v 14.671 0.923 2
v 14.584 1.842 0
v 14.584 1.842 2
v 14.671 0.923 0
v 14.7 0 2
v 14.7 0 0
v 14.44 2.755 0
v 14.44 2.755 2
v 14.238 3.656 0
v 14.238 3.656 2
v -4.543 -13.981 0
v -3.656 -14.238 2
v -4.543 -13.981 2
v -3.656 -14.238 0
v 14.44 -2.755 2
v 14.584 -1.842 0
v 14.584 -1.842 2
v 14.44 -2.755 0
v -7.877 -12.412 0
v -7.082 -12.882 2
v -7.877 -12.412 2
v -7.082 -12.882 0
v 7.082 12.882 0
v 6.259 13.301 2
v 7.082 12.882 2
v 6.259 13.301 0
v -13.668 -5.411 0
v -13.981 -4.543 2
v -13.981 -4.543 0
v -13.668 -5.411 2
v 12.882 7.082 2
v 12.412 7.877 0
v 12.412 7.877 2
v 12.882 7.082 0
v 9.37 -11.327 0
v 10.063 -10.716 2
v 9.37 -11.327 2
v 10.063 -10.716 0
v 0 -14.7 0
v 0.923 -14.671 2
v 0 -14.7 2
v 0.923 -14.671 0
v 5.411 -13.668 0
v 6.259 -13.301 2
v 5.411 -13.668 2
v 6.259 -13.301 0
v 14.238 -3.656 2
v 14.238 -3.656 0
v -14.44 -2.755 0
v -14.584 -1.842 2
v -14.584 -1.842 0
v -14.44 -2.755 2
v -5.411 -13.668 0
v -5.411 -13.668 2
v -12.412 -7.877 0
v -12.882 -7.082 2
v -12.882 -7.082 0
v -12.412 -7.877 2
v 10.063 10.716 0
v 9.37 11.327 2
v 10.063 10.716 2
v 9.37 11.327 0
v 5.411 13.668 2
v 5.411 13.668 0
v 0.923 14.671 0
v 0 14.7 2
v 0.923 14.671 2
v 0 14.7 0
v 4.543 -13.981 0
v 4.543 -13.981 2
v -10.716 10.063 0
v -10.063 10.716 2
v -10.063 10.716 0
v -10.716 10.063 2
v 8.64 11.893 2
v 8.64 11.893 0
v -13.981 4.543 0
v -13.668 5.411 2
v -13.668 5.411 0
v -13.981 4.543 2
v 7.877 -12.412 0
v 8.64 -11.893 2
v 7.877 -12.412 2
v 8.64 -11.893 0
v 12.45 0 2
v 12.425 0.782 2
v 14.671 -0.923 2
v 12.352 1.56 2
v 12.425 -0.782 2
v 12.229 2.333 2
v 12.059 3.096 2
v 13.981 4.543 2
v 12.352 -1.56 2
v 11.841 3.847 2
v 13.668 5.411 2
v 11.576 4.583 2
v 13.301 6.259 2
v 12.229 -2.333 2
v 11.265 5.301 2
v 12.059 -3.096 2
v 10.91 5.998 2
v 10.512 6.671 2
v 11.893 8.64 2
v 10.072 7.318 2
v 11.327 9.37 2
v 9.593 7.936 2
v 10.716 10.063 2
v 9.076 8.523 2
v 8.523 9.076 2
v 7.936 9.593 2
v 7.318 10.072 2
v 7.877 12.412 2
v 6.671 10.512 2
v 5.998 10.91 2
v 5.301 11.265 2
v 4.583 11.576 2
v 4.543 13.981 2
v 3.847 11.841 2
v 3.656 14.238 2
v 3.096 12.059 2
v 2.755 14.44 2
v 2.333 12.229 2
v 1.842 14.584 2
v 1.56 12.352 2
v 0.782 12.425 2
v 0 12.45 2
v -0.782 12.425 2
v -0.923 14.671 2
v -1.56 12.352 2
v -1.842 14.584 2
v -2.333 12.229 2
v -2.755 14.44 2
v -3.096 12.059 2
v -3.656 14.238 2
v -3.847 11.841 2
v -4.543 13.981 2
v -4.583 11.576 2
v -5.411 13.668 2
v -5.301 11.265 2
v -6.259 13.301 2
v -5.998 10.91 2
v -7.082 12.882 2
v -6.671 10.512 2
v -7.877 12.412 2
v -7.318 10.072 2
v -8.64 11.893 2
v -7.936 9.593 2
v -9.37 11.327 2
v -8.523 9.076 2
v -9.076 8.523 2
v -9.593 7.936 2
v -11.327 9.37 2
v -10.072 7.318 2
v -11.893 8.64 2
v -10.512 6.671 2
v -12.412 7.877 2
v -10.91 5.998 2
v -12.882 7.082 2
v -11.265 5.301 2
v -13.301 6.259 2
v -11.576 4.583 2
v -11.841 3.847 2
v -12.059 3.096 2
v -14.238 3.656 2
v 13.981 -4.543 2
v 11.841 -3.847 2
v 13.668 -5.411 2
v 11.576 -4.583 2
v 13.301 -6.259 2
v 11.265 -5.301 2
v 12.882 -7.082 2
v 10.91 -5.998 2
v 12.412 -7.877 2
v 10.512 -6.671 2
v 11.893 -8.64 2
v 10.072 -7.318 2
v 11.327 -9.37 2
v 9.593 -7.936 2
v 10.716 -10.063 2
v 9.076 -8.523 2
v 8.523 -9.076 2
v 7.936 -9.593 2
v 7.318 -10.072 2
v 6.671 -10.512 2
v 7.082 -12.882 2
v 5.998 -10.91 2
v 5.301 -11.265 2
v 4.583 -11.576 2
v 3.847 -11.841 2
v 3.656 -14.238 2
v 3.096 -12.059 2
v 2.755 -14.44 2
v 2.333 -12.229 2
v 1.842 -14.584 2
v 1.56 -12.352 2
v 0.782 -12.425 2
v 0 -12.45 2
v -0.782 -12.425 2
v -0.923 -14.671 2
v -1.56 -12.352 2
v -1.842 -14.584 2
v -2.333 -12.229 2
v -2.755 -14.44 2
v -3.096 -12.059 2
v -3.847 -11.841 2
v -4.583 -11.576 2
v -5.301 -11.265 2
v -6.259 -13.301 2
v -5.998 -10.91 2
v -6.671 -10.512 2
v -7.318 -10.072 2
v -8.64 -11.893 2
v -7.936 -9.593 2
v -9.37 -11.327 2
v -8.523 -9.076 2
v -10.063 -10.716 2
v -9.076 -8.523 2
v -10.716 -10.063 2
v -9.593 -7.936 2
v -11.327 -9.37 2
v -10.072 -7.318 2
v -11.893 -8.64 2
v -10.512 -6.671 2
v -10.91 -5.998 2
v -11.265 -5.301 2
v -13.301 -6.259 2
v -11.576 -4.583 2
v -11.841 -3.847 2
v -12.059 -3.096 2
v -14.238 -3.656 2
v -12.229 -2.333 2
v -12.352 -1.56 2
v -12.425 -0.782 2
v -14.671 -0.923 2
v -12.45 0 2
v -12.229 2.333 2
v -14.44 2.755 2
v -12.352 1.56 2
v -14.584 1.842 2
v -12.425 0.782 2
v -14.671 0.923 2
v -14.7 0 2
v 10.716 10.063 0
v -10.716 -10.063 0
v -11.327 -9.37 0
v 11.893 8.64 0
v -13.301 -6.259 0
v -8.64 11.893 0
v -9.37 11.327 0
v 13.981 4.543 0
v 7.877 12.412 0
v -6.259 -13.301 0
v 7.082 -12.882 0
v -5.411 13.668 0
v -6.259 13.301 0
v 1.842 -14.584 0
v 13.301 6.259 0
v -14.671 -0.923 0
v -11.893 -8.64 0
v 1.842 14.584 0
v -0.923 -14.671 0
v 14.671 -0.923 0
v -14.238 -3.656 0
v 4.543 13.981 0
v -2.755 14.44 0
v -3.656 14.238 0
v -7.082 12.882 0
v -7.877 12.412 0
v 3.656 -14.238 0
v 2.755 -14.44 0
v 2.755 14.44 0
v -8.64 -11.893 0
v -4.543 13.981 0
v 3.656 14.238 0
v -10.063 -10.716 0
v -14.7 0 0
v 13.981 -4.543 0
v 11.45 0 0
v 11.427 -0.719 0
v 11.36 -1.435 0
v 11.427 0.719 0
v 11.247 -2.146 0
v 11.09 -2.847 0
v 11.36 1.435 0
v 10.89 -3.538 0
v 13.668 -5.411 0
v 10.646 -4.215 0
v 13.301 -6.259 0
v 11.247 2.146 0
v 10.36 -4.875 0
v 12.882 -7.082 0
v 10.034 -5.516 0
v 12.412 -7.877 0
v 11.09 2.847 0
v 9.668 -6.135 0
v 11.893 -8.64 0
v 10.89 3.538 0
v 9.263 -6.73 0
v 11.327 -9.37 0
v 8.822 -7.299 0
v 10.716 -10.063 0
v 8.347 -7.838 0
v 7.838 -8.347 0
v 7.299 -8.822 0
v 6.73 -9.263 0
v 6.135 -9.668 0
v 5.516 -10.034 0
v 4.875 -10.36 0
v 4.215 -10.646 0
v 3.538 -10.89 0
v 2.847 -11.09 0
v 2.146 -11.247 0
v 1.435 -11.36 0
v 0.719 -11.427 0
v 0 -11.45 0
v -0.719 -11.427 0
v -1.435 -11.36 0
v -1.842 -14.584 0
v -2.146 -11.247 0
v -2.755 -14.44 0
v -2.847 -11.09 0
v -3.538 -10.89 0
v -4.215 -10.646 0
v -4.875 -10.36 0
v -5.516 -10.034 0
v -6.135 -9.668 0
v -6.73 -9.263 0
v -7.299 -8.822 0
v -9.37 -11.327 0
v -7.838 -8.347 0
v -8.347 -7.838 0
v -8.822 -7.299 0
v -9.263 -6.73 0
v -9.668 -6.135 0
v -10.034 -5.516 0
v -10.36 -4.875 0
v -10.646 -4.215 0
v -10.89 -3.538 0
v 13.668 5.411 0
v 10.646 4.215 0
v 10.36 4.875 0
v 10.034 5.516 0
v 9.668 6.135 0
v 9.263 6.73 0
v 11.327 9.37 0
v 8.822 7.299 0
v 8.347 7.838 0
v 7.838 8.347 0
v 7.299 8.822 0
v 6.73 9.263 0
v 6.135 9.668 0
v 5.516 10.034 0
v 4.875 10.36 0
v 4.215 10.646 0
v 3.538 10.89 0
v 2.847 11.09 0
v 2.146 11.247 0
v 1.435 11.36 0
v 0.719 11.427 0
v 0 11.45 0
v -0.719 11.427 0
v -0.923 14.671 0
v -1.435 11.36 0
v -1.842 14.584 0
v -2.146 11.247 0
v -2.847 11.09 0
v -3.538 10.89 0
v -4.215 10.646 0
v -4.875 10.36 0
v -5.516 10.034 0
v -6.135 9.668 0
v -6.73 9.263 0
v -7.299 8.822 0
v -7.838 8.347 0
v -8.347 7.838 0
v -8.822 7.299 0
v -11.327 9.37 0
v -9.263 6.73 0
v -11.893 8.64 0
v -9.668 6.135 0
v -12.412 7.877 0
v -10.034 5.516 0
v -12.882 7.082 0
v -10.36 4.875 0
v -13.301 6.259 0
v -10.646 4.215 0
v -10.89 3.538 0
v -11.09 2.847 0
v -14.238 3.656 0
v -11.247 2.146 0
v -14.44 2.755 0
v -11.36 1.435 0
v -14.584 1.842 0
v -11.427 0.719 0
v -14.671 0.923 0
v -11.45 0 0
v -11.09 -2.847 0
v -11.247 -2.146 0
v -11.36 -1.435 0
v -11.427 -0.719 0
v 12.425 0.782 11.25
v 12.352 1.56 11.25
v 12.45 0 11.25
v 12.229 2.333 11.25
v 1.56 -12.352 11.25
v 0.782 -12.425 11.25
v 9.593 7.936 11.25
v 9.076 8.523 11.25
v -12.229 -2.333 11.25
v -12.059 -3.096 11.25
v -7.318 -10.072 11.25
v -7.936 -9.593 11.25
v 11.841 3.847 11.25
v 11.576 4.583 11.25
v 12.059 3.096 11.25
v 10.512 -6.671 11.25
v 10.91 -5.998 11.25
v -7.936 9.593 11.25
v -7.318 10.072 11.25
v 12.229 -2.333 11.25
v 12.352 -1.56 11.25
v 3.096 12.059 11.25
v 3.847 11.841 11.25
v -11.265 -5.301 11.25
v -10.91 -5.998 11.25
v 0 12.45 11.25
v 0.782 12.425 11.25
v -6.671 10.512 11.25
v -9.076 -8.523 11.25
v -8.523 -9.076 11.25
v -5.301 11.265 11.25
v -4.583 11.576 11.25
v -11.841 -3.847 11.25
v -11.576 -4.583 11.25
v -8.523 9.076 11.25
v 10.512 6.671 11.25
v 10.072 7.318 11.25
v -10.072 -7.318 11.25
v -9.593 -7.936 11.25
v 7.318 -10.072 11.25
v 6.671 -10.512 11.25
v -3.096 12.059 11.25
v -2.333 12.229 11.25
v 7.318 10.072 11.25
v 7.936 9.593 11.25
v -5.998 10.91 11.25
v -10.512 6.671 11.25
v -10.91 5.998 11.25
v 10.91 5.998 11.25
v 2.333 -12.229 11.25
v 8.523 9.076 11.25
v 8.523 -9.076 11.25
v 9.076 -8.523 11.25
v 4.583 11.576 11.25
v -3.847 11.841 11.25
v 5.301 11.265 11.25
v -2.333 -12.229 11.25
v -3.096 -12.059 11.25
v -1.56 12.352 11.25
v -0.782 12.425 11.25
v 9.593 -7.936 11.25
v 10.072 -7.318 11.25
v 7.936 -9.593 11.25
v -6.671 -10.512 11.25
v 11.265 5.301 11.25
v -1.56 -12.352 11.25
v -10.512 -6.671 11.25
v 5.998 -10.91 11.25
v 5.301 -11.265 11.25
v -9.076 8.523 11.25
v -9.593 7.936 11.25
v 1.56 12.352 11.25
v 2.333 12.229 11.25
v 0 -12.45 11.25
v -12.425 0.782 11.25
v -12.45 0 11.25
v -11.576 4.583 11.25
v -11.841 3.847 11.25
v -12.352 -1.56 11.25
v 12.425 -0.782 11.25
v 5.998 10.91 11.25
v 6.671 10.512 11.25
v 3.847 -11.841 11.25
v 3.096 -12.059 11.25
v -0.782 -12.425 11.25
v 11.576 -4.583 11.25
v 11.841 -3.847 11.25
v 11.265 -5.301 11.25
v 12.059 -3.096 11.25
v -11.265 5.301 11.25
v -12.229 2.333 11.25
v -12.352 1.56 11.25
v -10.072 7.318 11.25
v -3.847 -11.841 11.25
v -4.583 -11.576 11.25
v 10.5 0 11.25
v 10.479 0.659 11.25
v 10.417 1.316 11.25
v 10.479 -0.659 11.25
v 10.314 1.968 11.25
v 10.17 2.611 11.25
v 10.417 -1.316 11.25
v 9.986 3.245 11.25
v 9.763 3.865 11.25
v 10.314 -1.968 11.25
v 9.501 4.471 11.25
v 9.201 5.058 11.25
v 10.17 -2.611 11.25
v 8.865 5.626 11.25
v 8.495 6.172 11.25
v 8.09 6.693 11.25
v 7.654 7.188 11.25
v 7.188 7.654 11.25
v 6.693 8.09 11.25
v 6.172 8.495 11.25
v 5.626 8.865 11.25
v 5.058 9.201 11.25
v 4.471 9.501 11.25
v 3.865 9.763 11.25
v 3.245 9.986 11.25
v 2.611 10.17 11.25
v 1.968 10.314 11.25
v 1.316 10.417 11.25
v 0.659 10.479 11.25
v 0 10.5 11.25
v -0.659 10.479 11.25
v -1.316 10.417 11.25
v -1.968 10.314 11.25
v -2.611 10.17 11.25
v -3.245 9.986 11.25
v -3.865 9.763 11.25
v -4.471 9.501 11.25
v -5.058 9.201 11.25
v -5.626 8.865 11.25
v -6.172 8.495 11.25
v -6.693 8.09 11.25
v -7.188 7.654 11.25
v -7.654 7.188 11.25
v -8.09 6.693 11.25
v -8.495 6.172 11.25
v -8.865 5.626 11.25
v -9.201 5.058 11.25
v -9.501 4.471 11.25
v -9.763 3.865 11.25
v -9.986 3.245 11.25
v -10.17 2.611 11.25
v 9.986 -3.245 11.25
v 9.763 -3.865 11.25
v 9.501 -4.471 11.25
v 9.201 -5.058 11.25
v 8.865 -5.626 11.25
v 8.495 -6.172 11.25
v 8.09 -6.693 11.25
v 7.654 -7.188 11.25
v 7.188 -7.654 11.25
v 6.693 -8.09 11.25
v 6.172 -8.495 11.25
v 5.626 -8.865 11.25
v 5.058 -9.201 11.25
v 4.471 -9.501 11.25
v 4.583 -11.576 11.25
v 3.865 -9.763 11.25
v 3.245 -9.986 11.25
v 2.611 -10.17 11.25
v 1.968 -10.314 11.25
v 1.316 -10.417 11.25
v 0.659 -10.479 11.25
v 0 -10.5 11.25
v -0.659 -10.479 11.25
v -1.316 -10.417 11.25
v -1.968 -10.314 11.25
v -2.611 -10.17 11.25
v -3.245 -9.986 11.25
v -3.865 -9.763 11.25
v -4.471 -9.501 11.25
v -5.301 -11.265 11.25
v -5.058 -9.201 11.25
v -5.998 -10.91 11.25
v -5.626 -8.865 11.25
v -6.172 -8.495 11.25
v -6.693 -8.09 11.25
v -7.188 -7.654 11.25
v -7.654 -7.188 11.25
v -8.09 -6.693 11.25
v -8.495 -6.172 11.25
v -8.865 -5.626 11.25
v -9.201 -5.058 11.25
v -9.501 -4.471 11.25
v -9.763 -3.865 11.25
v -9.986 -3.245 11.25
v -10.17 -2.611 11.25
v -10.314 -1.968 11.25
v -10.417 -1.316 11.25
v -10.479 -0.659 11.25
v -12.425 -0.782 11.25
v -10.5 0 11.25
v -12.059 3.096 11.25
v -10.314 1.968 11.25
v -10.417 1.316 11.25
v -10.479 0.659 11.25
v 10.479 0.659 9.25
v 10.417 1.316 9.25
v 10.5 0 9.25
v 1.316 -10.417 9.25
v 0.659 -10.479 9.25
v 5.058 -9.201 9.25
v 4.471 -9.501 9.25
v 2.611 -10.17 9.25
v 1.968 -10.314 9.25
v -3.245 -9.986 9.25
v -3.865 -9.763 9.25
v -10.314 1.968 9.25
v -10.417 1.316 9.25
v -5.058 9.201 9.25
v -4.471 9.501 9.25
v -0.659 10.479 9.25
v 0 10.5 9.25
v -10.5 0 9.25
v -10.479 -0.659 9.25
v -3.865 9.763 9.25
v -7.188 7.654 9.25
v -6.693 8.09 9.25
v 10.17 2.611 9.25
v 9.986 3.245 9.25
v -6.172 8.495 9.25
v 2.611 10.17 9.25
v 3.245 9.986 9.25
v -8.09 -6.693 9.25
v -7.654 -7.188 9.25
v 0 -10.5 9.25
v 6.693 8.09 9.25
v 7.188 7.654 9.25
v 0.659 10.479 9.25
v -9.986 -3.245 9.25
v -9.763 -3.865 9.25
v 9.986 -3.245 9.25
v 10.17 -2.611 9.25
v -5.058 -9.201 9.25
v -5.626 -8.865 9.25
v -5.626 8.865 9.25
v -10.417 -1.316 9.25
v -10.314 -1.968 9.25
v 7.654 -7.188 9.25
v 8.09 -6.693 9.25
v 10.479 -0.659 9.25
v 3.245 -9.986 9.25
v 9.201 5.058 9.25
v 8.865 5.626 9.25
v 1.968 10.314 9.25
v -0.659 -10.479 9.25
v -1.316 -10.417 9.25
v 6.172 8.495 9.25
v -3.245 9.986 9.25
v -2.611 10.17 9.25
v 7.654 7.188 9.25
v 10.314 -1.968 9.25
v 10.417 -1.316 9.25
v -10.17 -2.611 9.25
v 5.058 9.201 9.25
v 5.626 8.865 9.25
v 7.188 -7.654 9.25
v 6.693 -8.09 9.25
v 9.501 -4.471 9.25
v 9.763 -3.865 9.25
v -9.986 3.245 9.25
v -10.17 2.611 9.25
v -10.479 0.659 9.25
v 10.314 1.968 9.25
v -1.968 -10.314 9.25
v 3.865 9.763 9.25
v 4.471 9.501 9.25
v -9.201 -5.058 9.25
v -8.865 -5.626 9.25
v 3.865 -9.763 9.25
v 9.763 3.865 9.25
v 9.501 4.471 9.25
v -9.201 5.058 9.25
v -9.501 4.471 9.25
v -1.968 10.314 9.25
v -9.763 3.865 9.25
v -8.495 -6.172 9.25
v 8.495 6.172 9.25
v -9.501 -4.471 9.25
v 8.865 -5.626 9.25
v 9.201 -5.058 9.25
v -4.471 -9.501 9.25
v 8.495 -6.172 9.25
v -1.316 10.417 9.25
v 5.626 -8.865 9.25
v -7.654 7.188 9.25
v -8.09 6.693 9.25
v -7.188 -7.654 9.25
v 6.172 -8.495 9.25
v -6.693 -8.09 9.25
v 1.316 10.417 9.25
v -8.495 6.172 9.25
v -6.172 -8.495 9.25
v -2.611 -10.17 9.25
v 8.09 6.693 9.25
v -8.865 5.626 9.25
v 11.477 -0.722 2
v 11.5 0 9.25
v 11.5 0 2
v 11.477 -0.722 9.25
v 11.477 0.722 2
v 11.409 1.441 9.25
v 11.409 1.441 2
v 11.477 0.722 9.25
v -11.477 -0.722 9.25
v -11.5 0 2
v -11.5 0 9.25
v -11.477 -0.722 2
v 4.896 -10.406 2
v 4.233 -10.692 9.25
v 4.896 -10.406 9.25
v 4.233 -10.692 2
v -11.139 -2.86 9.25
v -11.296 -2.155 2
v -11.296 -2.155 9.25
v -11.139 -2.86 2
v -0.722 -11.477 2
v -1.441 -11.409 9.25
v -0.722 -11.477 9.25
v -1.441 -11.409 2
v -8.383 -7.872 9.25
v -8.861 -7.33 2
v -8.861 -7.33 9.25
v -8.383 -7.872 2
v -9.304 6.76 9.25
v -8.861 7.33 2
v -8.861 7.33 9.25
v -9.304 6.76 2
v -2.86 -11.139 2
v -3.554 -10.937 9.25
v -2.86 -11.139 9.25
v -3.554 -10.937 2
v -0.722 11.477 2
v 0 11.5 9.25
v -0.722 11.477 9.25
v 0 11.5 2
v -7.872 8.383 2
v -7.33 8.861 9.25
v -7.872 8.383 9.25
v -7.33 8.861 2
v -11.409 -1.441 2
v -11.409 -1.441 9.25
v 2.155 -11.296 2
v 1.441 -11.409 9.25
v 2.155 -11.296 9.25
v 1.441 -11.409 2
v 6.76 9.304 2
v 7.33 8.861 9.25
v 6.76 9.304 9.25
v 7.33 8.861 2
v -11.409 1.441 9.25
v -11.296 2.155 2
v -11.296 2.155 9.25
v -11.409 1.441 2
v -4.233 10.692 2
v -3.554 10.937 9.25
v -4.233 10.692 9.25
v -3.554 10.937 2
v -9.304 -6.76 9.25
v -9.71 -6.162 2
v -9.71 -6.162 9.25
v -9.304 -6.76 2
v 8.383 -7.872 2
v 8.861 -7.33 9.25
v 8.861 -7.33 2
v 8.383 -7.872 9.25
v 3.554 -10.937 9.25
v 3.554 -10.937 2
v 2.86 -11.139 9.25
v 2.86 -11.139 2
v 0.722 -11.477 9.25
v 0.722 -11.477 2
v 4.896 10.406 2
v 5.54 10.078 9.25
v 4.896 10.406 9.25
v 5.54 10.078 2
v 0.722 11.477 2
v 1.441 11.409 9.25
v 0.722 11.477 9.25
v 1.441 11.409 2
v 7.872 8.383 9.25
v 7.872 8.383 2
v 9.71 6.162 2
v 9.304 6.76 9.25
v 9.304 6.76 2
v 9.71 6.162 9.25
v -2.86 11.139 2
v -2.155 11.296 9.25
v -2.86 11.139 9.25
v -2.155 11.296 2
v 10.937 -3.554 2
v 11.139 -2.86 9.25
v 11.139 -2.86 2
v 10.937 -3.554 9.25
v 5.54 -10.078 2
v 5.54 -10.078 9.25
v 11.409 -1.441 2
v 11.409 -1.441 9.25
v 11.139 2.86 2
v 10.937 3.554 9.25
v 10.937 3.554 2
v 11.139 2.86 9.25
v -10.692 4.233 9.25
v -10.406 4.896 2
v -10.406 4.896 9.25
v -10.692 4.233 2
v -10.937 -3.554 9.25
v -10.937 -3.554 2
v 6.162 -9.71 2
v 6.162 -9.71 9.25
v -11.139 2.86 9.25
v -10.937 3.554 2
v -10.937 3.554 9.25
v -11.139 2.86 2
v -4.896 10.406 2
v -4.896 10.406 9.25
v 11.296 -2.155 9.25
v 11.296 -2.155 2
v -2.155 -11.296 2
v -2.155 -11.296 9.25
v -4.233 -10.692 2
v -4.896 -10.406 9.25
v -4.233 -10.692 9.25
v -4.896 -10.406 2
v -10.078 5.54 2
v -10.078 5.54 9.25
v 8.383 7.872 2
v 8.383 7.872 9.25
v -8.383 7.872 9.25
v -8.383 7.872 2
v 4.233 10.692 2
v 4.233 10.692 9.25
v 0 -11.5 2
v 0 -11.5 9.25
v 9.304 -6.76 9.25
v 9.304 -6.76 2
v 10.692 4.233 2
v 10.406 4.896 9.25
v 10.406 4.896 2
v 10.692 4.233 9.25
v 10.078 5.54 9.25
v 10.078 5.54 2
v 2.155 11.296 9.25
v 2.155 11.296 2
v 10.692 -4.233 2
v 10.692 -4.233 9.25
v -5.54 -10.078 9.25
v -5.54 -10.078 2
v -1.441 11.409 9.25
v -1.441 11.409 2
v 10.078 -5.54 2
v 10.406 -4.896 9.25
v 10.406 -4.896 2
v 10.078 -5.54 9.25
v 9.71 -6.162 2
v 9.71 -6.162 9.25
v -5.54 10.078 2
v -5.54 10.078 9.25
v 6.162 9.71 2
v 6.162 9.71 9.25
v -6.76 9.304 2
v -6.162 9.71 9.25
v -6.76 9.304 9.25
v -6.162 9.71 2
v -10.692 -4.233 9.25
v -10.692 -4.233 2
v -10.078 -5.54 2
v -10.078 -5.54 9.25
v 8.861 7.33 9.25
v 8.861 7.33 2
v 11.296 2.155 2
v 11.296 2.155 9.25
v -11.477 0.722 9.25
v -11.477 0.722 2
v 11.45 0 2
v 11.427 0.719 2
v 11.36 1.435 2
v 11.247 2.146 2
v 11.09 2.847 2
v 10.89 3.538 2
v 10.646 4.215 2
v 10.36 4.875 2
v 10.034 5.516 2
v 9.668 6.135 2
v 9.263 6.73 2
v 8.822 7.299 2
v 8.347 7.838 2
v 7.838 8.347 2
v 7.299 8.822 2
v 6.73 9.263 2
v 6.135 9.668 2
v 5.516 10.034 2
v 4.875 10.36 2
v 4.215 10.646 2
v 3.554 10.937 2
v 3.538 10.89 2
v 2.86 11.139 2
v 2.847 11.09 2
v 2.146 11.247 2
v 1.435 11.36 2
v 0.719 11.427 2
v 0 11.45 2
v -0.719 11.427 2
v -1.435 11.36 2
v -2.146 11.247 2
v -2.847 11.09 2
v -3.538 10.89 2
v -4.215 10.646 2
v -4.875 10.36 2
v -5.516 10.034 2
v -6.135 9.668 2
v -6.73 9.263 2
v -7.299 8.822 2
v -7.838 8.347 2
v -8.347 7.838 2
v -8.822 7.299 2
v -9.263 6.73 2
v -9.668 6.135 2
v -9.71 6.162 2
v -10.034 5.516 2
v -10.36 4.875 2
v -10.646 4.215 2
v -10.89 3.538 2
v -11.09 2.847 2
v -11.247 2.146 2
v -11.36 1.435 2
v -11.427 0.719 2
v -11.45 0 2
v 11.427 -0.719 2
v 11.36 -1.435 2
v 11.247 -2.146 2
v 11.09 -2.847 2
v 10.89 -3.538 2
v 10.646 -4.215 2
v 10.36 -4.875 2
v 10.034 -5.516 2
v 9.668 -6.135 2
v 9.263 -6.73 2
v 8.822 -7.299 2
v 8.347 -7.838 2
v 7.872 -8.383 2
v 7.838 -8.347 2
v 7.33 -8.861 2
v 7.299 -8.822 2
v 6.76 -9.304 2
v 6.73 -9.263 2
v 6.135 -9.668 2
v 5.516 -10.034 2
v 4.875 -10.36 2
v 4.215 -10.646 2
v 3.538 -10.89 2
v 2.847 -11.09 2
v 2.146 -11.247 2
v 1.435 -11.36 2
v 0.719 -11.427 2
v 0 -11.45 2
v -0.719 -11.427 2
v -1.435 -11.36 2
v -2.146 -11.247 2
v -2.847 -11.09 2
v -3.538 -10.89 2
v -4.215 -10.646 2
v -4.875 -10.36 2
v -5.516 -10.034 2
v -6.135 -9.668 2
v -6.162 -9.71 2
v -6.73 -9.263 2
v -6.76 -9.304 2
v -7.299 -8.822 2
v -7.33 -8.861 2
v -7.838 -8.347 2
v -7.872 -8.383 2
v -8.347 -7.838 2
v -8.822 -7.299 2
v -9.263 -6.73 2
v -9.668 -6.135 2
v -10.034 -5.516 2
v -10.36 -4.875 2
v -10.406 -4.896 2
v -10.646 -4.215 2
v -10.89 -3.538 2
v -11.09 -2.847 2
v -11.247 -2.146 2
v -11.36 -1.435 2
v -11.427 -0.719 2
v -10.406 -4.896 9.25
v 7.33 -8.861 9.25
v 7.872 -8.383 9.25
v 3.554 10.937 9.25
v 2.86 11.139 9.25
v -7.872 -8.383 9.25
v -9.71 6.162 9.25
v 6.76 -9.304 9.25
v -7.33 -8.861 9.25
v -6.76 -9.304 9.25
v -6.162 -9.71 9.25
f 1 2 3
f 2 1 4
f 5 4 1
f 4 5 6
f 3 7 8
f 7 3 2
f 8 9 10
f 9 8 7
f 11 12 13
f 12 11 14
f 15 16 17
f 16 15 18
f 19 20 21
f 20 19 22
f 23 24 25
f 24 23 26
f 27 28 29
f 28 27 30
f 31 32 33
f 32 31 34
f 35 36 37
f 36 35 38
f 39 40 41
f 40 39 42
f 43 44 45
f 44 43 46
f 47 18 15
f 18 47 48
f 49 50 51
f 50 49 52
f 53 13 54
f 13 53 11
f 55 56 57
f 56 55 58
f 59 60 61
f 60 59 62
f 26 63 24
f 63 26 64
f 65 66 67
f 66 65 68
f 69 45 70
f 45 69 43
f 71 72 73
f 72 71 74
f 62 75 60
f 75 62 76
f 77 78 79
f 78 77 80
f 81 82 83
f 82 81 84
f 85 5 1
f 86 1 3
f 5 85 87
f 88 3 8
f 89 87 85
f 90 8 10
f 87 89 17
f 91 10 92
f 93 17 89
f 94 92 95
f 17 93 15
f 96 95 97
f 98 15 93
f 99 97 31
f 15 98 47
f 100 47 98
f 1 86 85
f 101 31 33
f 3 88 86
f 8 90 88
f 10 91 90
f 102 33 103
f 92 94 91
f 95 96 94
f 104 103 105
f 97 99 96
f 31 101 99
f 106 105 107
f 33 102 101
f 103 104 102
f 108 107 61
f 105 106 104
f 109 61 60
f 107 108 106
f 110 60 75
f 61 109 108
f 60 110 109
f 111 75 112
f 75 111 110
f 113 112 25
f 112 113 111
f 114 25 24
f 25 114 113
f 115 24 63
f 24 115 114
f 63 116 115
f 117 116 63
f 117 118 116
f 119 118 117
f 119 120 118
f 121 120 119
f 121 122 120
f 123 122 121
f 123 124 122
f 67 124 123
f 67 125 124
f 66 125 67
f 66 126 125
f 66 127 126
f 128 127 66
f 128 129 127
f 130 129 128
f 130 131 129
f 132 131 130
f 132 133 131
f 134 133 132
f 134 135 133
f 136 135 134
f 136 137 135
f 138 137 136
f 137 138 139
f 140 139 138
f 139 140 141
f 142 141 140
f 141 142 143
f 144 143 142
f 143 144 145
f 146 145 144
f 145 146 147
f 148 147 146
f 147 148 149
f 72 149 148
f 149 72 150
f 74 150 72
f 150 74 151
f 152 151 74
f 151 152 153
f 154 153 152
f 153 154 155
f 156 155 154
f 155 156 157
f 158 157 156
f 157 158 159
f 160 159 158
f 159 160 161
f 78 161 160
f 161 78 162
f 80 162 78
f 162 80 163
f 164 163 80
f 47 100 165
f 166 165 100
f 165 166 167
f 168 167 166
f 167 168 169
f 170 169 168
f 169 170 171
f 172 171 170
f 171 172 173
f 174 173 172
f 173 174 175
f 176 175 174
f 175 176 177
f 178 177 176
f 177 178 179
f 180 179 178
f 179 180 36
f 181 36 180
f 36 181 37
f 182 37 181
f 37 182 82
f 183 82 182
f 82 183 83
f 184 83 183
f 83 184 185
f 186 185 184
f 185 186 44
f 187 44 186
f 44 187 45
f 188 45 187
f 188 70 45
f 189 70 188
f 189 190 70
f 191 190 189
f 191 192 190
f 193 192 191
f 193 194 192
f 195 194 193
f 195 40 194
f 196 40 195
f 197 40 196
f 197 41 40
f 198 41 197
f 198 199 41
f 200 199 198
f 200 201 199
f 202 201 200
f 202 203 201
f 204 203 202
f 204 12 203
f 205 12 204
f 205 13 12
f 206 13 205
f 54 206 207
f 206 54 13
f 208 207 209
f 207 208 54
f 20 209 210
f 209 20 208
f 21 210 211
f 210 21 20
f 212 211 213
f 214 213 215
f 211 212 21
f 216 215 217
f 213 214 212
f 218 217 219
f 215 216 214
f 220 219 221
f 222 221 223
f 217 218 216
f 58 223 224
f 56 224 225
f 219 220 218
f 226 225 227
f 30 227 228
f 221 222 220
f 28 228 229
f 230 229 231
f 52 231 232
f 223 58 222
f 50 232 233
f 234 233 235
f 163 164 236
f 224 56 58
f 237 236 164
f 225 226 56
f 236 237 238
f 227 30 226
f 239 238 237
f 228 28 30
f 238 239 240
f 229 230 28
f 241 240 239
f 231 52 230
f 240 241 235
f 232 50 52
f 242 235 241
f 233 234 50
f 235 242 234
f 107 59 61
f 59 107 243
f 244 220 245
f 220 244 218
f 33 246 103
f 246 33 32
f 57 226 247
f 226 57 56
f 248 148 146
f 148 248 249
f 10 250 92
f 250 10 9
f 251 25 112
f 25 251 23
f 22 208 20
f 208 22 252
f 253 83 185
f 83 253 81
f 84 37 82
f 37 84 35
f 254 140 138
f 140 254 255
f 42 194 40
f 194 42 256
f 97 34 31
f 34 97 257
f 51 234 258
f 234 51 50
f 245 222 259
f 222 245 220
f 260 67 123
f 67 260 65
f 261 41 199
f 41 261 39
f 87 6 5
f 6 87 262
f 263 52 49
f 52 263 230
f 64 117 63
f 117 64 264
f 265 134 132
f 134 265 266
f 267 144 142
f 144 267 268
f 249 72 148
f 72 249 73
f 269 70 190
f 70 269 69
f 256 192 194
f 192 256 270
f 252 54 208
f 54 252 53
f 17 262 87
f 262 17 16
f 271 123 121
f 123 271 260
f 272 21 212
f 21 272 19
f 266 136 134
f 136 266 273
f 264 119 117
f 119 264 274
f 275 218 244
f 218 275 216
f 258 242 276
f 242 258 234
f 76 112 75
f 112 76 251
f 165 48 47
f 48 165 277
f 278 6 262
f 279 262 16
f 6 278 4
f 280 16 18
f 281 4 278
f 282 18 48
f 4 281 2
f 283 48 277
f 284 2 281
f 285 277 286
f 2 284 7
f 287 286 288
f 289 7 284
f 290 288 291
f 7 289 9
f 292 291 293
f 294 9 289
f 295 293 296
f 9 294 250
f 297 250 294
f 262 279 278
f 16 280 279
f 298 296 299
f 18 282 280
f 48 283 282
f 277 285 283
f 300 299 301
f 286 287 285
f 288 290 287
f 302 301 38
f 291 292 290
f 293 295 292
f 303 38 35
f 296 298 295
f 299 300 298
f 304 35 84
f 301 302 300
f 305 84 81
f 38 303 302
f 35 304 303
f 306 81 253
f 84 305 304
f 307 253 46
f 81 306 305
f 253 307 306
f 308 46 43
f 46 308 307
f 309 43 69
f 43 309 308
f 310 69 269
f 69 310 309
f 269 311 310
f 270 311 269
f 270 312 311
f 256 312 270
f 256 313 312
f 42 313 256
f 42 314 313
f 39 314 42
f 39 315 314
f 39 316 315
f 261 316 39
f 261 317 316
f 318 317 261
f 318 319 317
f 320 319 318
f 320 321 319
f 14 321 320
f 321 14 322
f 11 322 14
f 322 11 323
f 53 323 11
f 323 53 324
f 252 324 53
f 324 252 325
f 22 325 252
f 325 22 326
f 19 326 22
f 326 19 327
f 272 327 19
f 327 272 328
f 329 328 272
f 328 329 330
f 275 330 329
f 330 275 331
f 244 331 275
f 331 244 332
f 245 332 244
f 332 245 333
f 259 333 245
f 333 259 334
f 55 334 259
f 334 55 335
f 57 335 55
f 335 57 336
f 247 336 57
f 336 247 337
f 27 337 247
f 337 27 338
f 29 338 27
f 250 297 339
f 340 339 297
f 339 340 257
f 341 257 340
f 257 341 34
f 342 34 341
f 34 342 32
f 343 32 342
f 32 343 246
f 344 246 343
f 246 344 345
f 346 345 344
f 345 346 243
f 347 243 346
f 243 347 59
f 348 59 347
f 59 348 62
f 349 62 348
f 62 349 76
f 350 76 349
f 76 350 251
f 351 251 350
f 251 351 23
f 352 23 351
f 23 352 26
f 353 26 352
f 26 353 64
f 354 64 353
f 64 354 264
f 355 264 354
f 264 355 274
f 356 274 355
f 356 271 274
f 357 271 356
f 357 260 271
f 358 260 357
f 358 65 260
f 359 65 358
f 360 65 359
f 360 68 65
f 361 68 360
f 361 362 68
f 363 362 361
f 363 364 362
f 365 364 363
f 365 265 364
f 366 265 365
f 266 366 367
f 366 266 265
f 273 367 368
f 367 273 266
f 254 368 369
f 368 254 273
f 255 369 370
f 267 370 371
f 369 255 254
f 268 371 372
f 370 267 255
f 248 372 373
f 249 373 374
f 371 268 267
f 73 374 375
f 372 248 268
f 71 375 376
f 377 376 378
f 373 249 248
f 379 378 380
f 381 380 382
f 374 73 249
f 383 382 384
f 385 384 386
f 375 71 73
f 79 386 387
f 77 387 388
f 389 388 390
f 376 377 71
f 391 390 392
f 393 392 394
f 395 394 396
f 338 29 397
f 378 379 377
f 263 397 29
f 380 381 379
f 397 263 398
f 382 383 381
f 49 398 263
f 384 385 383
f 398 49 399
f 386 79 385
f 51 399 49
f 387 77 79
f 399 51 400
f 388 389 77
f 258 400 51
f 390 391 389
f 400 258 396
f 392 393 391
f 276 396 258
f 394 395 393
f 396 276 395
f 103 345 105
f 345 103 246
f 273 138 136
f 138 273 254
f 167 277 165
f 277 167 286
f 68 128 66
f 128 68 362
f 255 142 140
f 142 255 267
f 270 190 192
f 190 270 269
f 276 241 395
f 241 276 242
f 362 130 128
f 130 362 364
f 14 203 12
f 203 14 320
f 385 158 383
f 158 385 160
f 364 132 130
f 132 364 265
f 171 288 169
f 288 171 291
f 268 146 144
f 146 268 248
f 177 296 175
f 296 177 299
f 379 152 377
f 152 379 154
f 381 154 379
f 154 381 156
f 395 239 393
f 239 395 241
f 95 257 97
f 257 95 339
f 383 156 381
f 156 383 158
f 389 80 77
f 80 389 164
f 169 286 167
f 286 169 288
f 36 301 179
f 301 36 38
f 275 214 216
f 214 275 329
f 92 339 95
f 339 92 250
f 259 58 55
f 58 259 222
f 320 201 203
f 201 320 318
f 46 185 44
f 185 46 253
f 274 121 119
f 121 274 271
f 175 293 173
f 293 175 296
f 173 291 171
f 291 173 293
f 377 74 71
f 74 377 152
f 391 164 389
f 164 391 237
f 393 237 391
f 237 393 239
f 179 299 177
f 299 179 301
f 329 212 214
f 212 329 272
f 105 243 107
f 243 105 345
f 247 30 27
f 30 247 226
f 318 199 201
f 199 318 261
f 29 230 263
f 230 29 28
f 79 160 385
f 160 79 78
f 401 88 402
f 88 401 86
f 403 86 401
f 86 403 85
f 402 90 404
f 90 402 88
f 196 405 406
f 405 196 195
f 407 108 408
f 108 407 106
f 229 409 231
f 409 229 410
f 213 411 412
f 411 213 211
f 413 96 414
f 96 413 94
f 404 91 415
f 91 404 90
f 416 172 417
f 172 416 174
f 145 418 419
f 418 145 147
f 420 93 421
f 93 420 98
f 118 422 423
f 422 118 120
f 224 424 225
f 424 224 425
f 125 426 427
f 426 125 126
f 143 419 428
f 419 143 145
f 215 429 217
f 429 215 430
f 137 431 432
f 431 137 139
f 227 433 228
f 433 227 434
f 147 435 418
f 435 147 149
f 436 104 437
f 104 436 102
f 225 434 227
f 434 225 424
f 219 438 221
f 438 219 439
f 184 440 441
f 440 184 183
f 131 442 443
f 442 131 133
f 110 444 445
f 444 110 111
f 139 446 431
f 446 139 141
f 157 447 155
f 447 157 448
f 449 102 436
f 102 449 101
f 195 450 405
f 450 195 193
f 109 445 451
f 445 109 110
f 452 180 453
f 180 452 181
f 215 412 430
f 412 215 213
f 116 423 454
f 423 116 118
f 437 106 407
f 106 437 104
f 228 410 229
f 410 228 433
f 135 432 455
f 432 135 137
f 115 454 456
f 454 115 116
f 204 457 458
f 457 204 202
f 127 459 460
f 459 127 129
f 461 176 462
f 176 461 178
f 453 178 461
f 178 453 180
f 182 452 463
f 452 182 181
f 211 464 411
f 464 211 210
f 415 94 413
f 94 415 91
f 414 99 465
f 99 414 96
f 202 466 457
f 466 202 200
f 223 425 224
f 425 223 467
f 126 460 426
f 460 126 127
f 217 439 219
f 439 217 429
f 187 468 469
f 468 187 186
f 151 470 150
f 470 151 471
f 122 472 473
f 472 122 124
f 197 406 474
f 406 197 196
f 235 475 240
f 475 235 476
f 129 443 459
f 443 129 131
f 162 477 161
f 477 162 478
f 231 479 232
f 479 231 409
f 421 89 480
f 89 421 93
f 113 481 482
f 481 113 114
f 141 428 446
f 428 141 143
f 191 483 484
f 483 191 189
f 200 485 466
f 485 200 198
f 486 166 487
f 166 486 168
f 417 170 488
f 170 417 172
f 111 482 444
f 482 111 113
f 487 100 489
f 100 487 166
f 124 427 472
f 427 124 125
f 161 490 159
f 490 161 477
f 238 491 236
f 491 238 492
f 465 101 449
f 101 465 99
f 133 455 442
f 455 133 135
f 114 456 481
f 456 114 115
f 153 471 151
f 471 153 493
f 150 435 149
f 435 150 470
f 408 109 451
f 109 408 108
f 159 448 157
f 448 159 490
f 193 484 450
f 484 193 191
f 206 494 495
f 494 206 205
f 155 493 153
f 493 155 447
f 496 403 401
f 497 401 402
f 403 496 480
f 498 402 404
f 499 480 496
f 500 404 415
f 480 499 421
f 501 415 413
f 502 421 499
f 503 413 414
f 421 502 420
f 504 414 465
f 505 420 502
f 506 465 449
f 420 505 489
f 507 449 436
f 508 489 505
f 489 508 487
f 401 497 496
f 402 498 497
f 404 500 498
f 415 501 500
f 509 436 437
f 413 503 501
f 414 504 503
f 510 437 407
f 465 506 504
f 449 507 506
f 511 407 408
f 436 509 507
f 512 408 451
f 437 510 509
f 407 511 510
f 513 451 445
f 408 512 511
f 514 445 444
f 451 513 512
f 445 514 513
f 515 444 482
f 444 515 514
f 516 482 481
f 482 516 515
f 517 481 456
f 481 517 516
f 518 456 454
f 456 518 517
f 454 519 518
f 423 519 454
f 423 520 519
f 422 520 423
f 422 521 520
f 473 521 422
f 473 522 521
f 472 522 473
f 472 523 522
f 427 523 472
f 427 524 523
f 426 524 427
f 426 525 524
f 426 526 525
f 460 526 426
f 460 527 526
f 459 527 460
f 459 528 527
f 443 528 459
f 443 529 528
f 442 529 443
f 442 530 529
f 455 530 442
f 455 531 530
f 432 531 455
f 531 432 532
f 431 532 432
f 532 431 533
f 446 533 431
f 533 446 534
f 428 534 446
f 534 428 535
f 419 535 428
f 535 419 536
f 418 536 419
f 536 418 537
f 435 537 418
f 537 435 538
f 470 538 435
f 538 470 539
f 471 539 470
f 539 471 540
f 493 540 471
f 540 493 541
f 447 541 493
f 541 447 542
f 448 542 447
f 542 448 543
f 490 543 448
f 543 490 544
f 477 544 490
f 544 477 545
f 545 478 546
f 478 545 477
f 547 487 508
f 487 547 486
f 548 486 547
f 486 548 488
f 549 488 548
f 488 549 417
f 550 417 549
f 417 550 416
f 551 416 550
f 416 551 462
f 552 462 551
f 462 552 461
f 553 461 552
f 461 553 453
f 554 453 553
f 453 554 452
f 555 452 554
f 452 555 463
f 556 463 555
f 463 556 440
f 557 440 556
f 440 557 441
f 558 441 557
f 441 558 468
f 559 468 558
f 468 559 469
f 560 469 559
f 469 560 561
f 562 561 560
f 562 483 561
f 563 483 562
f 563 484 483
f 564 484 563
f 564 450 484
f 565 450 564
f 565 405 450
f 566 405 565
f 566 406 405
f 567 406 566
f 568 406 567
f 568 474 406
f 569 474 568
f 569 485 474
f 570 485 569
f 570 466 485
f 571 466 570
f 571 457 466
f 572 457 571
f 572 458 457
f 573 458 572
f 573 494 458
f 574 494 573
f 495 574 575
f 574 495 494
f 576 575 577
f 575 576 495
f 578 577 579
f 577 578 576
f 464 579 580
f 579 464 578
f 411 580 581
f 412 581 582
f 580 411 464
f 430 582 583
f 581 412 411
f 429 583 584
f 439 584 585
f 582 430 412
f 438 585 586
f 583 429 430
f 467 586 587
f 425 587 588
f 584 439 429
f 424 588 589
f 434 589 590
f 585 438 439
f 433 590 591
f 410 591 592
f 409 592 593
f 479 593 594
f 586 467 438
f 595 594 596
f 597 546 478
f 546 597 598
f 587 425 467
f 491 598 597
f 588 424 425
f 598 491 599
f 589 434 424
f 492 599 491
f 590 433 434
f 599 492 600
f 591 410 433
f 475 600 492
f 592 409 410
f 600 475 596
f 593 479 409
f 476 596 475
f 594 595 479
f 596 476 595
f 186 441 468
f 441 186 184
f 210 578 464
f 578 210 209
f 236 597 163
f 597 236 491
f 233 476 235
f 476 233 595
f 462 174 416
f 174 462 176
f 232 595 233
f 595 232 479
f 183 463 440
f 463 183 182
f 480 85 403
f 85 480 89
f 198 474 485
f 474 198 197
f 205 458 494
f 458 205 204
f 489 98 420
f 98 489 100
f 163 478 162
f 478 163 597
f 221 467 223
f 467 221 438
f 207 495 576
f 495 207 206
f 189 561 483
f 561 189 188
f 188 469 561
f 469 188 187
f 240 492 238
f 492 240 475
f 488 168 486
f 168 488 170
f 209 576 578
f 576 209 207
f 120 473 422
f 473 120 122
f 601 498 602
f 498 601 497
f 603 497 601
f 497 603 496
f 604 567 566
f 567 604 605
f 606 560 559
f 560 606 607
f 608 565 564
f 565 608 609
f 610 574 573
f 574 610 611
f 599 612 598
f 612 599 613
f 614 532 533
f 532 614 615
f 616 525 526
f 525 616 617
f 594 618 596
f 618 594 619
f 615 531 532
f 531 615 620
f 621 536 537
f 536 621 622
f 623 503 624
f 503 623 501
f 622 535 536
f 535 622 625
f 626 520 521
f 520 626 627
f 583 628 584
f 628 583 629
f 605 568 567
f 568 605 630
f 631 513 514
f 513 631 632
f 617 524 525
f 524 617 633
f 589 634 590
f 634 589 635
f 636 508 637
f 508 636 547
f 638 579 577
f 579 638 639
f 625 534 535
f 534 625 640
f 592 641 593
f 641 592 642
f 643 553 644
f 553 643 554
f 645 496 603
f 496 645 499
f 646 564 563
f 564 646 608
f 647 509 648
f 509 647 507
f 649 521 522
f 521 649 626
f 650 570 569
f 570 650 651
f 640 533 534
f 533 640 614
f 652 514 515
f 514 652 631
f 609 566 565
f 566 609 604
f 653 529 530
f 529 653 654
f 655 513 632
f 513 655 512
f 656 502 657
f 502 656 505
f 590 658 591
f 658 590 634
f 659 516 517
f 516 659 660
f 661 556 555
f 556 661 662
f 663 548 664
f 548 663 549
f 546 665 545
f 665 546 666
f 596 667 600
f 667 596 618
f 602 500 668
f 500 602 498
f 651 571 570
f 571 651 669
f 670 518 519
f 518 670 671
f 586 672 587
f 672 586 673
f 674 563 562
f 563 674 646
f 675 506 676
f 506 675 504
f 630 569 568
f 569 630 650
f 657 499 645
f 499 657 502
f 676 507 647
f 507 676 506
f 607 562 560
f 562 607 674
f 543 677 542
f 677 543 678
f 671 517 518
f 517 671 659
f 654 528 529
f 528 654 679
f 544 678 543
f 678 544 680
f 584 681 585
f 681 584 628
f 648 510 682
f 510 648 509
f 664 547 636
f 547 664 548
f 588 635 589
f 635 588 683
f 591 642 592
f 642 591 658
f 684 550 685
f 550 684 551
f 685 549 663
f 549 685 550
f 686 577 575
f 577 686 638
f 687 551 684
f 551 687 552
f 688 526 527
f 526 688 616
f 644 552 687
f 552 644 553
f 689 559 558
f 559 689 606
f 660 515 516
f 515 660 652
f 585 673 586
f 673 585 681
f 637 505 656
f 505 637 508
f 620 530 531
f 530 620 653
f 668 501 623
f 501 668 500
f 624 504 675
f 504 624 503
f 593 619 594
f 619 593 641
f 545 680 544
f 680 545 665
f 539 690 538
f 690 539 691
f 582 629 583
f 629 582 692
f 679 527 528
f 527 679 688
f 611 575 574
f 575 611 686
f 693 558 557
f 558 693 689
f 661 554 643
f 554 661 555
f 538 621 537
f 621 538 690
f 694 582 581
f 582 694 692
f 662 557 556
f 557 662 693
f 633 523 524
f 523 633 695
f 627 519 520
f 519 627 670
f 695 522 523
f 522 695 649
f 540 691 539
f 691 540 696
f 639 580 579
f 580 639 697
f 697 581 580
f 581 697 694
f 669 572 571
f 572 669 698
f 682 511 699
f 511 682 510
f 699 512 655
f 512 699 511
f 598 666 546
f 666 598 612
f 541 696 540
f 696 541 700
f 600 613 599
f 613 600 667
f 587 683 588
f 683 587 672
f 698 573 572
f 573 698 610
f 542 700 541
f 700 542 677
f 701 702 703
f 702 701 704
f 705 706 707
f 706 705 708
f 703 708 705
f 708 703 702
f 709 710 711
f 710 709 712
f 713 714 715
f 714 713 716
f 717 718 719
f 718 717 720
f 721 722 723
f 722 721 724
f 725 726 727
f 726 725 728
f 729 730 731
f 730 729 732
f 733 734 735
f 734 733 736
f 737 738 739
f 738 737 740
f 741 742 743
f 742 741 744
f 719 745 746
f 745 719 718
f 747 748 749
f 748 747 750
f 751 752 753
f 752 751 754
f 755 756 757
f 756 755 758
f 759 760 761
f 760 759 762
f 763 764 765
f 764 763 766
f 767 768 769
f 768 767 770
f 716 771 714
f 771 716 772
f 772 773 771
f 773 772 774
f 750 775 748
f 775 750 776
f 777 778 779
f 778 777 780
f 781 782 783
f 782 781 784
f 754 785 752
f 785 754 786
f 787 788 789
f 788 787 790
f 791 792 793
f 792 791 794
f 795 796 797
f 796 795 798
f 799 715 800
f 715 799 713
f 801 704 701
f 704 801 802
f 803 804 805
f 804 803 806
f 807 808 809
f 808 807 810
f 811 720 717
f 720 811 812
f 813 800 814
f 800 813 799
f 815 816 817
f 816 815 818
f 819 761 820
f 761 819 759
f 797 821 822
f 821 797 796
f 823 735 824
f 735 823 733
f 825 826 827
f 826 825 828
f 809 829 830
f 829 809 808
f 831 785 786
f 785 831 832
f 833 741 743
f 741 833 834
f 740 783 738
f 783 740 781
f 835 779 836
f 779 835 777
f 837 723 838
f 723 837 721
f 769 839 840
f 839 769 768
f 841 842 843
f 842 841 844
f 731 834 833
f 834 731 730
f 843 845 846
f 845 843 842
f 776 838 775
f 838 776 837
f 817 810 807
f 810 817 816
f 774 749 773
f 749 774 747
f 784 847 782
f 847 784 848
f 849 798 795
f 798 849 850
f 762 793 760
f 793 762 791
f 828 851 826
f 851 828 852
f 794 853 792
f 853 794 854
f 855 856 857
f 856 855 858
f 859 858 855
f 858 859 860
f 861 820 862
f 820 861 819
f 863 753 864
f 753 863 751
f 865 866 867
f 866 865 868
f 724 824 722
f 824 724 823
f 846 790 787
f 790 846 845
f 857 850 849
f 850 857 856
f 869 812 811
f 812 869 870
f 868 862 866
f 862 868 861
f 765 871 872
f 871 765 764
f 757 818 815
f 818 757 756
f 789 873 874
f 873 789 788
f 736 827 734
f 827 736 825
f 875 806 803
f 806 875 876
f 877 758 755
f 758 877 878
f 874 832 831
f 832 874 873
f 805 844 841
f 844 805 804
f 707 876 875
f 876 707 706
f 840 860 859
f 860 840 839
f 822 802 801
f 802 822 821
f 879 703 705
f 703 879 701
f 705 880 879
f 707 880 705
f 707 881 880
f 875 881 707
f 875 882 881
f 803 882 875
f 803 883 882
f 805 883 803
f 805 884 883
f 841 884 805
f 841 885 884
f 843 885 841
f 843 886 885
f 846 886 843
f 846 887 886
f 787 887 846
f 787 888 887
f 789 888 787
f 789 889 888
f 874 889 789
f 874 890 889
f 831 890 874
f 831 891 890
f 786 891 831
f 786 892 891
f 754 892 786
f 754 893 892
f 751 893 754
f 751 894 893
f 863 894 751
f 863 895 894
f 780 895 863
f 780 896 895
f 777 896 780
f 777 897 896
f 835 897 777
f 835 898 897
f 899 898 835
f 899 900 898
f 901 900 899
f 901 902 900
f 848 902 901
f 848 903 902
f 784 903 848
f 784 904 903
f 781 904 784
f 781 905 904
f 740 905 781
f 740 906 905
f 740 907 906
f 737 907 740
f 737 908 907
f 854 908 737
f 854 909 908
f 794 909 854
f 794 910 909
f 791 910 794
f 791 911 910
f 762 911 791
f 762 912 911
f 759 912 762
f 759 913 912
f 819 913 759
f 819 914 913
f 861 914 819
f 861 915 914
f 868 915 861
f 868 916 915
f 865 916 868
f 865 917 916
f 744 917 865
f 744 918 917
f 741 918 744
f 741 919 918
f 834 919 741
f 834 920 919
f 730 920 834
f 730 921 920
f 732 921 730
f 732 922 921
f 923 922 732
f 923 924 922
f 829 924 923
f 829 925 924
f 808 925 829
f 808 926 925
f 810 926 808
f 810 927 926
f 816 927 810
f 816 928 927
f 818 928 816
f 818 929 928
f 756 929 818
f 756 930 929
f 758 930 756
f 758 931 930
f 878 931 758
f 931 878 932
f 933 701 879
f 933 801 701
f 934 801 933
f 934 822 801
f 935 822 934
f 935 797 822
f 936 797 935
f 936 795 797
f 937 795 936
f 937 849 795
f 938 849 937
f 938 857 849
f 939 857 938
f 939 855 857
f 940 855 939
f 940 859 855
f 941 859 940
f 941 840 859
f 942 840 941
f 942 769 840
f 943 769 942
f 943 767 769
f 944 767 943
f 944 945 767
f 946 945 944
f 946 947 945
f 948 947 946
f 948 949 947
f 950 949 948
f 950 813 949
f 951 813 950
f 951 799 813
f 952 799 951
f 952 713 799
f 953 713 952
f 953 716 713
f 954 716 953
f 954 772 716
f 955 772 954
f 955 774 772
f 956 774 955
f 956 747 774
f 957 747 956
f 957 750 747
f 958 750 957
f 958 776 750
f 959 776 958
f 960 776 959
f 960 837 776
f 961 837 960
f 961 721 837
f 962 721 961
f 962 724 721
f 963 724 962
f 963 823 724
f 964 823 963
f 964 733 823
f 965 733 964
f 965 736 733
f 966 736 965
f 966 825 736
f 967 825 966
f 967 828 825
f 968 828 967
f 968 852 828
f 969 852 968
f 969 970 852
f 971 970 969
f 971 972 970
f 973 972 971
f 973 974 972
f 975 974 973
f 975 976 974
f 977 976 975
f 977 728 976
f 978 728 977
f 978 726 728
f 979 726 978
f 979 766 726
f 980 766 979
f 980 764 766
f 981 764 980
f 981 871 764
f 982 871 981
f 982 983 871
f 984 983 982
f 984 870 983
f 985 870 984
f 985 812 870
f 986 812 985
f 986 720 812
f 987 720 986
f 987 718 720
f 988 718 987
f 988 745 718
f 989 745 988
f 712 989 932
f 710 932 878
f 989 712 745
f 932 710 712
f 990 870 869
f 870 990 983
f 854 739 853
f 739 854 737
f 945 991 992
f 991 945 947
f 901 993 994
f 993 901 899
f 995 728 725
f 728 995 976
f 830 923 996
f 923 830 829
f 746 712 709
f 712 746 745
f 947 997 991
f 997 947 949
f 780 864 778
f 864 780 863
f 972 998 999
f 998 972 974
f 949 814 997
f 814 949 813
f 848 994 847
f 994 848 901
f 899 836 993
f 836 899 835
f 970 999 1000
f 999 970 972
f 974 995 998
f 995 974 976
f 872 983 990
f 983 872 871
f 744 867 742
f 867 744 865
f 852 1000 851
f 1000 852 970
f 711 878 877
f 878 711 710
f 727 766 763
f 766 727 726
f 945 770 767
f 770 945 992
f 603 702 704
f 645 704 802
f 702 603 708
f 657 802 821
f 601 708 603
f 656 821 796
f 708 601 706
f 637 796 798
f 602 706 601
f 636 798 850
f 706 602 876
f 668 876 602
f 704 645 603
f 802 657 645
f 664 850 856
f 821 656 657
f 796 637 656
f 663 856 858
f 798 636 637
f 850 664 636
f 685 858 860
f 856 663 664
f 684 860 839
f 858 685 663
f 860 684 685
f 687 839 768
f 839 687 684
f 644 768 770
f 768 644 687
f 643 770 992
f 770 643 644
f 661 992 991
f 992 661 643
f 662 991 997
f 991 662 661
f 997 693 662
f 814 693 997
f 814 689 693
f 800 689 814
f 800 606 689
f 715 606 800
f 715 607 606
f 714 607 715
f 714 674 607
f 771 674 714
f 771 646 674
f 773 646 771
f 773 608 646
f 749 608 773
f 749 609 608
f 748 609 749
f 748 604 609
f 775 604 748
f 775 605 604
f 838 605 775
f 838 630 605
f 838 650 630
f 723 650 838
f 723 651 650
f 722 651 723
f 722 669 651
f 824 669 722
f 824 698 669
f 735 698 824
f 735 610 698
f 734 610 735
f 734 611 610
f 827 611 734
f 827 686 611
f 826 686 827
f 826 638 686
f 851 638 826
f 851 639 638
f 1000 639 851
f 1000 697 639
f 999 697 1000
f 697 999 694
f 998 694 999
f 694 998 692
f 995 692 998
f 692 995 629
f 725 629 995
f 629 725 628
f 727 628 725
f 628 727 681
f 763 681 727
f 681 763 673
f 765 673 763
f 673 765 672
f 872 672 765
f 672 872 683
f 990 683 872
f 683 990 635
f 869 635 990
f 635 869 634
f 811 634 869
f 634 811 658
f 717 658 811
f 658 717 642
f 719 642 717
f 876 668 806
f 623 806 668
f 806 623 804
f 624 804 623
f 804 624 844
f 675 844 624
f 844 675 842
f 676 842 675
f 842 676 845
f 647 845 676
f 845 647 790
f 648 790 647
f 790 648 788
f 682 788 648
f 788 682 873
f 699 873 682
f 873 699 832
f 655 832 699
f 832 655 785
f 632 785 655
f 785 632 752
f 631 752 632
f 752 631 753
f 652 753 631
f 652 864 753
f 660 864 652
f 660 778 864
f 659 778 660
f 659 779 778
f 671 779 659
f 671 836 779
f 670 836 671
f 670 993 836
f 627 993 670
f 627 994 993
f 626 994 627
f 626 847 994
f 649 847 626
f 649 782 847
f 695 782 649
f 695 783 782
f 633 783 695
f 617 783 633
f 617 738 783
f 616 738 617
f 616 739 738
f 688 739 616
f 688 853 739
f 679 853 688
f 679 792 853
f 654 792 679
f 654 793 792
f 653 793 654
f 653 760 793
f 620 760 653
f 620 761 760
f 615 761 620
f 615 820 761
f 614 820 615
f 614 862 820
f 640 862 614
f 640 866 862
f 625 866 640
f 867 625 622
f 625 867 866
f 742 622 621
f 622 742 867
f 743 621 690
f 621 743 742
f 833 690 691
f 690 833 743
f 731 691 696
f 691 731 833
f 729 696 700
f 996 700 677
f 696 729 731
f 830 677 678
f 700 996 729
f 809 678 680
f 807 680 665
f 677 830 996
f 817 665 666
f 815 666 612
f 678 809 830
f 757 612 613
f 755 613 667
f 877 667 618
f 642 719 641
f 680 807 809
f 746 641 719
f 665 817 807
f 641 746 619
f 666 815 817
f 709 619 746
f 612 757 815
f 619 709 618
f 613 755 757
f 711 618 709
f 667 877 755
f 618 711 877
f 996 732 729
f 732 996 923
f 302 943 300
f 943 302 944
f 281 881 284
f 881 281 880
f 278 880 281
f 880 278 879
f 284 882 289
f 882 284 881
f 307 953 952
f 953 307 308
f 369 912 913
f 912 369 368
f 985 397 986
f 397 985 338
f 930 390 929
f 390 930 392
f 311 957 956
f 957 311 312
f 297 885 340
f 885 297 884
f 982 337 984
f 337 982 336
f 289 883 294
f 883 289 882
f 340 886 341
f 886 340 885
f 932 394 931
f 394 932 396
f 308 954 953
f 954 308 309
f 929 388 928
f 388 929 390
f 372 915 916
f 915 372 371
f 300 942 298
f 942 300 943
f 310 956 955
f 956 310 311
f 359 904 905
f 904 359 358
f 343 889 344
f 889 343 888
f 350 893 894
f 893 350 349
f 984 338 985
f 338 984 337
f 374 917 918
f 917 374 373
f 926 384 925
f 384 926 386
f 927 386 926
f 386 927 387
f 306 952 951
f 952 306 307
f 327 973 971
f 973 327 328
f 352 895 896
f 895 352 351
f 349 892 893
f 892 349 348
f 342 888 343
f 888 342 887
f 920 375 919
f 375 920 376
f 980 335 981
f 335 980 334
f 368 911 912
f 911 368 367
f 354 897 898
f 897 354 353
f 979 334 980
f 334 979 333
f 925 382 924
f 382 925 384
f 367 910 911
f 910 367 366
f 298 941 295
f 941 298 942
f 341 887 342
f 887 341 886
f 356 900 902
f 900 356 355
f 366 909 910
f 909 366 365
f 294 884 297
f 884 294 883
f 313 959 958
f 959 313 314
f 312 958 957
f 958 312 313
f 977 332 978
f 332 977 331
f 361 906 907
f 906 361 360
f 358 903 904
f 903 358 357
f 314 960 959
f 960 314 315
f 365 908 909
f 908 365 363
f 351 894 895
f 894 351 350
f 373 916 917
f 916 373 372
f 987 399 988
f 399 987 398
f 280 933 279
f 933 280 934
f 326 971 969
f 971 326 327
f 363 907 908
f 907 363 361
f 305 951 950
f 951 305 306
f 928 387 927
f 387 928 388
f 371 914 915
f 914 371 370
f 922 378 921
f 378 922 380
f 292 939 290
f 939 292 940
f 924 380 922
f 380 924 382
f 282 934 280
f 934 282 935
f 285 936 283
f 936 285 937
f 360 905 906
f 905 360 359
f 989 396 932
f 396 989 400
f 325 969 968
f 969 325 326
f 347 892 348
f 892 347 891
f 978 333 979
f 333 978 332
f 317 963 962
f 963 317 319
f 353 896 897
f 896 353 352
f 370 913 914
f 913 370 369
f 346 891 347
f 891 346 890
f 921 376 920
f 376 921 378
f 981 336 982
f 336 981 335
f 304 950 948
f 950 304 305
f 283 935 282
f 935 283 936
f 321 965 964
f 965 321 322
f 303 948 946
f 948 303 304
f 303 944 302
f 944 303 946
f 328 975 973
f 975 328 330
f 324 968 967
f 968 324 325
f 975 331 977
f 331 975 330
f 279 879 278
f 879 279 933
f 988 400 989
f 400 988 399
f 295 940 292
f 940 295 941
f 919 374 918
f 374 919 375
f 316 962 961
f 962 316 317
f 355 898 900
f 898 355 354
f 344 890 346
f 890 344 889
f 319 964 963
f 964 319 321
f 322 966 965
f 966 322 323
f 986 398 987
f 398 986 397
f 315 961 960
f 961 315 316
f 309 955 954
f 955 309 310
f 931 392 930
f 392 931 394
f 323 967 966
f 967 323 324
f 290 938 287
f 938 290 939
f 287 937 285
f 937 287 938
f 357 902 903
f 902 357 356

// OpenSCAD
// Customizable Filament Spool insert for use with Roller Bearings.
// This should be able to be used with any size roller bearing, as long as 
// the roller bearing is smaller than the hole in the filament spool.
//
// Numerous prints were done using this 8x22x7 ball bearing:
// 608ZZ 8x22x7 Shielded Greased Miniature Ball Bearings
// http://www.amazon.com/gp/product/B002BBD6X4
//
// Tony Hansen 2015


// The diameter of the hole in the filament spool (in mm):
customizable_spool_diameter = 25.4;
// If desired, a convex insert can be created by setting a different top value:
customizable_spool_diameter_top = 25.4;
// The diameter of the ball bearing (in mm):
customizable_bearing_diameter = 22;
// The height of the ball bearing (in mm):
customizable_bearing_depth = 7;

module SpoolerWithBearing(
    spool_diameter,
    spool_diameter_top,
    bearing_diameter,
    bearing_depth,
    bearing_extra_diameter = 1,
    bearing_extra_depth = 0.25,
    spool_outer_lip_width = 2,
    spool_outer_lip_depth = 2,
    spool_inner_lip_depth = 2,
    spool_inner_top_lip_depth = 2,
    spool_inner_bottom_lip_width = 0.1,
    spool_diameter_slop = 0.5
) {
    spool_depth = bearing_depth + bearing_extra_depth + spool_inner_top_lip_depth;
    bearing_epsilon = 0.01;


    difference() {
        $fn = 100;
        union() {
            // outer lip
            color("green") cylinder(d=spool_diameter + spool_outer_lip_width*2, h=spool_outer_lip_depth);

            // spool holder
            color("blue") cylinder(d1=spool_diameter - spool_diameter_slop, 
                                d2=spool_diameter_top - spool_diameter_slop, h=spool_outer_lip_depth + spool_depth);
        }

        // inner core
        translate([0,0,-bearing_epsilon])
        color("yellow") 
        cylinder(d=bearing_diameter + bearing_extra_diameter - spool_inner_lip_depth, 
            h=spool_outer_lip_depth + spool_depth+2*bearing_epsilon);
        
        // bearing slot
        translate([0,0,spool_inner_lip_depth])
        color("red") cylinder(d=bearing_diameter + bearing_extra_diameter, h=bearing_depth + bearing_extra_depth);
        
        // nub
        color("green") cylinder(d=bearing_diameter + bearing_extra_diameter - spool_inner_bottom_lip_width,h=spool_inner_lip_depth);
    }
}

SpoolerWithBearing(
    spool_diameter = customizable_spool_diameter,
    spool_diameter_top = customizable_spool_diameter_top,
    bearing_diameter = customizable_bearing_diameter,
    bearing_depth = customizable_bearing_depth);
